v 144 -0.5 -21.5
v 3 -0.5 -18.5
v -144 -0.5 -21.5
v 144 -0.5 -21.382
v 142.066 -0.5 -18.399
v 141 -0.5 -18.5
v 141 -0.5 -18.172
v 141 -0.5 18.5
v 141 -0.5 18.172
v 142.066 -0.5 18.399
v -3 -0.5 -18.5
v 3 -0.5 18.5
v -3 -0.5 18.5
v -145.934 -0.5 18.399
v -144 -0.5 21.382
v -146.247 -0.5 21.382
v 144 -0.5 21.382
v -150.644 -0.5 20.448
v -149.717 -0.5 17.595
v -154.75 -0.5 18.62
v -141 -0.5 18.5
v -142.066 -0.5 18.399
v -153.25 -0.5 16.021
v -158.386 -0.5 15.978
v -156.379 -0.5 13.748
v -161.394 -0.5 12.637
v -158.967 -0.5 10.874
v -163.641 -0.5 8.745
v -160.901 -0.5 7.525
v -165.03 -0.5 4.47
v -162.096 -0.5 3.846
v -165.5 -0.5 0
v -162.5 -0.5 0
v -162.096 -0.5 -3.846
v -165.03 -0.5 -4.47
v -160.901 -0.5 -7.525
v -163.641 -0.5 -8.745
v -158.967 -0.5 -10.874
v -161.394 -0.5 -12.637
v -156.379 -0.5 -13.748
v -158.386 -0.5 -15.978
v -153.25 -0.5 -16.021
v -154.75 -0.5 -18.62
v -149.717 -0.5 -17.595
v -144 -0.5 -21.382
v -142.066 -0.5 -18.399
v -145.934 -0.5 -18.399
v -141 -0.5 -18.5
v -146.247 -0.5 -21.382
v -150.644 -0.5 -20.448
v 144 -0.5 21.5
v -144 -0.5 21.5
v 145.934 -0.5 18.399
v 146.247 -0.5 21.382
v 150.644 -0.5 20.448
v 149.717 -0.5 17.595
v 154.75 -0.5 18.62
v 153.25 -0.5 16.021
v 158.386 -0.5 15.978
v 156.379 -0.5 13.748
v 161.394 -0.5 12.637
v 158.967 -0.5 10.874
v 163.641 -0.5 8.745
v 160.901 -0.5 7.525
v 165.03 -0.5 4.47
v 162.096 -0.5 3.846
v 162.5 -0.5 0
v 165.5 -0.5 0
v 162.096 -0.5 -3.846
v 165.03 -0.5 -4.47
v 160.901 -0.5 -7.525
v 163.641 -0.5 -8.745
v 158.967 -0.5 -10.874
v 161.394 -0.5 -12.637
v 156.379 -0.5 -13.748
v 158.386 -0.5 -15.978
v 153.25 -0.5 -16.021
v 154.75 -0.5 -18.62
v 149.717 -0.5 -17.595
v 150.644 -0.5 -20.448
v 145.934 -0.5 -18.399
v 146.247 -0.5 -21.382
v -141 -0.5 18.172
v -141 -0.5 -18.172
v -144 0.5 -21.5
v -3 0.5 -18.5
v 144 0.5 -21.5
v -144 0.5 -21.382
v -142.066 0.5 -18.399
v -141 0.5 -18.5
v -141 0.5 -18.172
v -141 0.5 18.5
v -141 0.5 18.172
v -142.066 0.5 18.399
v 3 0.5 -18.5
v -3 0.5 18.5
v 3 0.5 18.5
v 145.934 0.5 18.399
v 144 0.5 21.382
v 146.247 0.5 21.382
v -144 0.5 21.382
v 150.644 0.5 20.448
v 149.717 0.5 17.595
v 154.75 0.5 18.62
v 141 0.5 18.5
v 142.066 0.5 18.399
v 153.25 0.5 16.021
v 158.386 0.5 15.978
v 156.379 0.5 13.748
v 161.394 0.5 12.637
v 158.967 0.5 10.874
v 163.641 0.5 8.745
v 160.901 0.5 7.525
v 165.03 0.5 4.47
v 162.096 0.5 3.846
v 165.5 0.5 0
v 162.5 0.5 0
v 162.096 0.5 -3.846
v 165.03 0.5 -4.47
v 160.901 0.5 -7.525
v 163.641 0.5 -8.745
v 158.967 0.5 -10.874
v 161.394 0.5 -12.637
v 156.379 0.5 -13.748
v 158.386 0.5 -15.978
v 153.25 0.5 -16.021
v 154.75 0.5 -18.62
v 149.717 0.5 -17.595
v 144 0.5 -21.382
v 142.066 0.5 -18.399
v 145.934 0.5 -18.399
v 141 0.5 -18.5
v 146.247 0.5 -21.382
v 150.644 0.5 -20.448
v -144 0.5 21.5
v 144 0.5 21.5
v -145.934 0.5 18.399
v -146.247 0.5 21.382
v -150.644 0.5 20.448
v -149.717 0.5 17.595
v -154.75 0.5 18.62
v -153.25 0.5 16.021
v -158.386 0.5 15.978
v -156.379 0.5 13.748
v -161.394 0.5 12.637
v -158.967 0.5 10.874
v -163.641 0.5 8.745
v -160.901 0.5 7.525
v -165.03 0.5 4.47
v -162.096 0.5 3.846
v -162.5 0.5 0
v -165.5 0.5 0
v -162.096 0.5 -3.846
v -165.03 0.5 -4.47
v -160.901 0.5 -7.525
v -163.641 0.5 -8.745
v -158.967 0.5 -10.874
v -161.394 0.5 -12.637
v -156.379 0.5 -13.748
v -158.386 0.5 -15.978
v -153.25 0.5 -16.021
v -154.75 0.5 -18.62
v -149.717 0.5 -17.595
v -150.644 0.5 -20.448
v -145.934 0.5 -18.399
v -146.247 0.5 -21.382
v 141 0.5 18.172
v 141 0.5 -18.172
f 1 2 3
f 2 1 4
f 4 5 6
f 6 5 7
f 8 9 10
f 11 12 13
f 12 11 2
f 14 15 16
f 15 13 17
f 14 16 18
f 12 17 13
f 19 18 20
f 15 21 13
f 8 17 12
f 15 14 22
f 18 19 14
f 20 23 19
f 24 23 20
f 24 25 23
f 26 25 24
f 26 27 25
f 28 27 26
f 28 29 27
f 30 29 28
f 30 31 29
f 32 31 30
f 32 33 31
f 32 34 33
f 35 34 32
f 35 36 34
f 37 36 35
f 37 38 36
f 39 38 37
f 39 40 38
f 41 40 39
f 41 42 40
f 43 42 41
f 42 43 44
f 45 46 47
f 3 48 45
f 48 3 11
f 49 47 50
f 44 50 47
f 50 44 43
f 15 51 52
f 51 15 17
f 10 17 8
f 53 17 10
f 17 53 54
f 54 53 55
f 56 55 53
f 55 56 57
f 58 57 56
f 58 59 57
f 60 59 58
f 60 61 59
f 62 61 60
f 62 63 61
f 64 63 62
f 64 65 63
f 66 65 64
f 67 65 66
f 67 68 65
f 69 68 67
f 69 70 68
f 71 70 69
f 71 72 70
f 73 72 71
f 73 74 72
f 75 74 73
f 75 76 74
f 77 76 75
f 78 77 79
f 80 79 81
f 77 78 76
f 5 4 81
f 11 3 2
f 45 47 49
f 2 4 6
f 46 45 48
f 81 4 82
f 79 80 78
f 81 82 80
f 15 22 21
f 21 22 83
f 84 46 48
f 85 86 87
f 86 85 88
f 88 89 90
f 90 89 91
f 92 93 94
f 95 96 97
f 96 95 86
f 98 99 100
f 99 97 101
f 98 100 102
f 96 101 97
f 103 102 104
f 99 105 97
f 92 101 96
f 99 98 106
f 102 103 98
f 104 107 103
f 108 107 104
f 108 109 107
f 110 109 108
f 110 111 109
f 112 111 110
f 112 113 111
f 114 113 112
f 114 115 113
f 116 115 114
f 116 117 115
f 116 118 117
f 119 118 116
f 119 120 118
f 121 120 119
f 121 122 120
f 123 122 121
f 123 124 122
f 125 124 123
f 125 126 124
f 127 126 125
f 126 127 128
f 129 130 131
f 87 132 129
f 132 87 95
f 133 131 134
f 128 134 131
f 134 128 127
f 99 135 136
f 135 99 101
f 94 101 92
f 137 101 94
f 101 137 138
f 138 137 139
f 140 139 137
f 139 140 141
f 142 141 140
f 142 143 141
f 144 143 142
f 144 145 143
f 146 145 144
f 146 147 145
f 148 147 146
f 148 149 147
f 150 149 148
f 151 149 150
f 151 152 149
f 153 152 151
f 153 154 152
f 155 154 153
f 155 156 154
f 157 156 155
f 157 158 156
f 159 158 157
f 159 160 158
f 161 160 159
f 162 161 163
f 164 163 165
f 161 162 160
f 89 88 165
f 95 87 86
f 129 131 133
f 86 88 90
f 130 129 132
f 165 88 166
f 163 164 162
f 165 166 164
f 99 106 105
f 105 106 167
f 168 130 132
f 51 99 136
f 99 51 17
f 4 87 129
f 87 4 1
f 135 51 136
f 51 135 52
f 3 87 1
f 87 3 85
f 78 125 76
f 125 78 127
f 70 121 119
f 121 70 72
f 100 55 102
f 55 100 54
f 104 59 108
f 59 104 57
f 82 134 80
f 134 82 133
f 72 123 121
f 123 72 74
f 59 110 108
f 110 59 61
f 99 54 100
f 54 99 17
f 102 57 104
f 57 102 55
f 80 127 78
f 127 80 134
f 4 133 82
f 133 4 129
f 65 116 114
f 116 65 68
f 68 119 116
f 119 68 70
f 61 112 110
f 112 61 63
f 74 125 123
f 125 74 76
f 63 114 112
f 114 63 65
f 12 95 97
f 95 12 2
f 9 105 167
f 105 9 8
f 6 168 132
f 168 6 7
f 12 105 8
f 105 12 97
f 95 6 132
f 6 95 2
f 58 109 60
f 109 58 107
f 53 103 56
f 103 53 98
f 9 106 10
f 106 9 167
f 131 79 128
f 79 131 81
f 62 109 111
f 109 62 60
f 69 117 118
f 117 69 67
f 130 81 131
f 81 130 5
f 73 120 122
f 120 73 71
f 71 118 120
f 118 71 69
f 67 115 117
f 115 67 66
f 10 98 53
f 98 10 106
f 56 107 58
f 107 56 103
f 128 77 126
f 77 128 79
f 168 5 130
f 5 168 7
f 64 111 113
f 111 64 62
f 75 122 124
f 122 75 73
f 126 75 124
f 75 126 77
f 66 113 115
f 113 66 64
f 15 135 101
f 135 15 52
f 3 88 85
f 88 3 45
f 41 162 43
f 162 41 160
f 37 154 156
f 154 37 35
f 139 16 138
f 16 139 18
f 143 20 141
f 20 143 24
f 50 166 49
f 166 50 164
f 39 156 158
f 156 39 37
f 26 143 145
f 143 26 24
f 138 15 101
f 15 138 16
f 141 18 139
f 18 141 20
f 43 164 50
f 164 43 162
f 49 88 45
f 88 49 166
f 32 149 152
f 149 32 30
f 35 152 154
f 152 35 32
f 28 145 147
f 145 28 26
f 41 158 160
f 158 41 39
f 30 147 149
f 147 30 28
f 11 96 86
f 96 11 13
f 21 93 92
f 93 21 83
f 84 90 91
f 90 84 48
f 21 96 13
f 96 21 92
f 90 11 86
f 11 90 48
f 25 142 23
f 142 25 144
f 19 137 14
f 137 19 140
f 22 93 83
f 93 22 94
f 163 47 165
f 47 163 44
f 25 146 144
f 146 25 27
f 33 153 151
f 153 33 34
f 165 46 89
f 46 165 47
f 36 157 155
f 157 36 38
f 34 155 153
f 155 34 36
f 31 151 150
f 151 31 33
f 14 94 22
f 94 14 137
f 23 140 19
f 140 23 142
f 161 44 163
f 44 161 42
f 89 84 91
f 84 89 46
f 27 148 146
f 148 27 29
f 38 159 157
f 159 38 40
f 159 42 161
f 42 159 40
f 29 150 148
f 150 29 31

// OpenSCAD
module HighGoal(rot,mir) {
    rotate(a=rot) {
        mirror(v=mir) {
            rotate(a=[90,0,0]) {
                translate([-144,-21.5,-0.5]) {
                    difference() {
                        union() {
                            cube([144,43,1]);
                            translate([0,21.5,0]) {
                                cylinder(h=1, r=21.5);
                            }
                        }
                        union() {
                            translate([3,3,0]) {
                                cube([138,37,1]);
                            }
                            translate([0,21.5,0]) {
                                cylinder(h=1, r=18.5);
                            }
                        }
                    }
                }
            }
        }
    }
}
module DualHighGoal() {
    translate([0,0,0]) {
        HighGoal();
    }
    translate([0,0,0]) {
        HighGoal(0,[0,1,0]);
    }
}

DualHighGoal();
